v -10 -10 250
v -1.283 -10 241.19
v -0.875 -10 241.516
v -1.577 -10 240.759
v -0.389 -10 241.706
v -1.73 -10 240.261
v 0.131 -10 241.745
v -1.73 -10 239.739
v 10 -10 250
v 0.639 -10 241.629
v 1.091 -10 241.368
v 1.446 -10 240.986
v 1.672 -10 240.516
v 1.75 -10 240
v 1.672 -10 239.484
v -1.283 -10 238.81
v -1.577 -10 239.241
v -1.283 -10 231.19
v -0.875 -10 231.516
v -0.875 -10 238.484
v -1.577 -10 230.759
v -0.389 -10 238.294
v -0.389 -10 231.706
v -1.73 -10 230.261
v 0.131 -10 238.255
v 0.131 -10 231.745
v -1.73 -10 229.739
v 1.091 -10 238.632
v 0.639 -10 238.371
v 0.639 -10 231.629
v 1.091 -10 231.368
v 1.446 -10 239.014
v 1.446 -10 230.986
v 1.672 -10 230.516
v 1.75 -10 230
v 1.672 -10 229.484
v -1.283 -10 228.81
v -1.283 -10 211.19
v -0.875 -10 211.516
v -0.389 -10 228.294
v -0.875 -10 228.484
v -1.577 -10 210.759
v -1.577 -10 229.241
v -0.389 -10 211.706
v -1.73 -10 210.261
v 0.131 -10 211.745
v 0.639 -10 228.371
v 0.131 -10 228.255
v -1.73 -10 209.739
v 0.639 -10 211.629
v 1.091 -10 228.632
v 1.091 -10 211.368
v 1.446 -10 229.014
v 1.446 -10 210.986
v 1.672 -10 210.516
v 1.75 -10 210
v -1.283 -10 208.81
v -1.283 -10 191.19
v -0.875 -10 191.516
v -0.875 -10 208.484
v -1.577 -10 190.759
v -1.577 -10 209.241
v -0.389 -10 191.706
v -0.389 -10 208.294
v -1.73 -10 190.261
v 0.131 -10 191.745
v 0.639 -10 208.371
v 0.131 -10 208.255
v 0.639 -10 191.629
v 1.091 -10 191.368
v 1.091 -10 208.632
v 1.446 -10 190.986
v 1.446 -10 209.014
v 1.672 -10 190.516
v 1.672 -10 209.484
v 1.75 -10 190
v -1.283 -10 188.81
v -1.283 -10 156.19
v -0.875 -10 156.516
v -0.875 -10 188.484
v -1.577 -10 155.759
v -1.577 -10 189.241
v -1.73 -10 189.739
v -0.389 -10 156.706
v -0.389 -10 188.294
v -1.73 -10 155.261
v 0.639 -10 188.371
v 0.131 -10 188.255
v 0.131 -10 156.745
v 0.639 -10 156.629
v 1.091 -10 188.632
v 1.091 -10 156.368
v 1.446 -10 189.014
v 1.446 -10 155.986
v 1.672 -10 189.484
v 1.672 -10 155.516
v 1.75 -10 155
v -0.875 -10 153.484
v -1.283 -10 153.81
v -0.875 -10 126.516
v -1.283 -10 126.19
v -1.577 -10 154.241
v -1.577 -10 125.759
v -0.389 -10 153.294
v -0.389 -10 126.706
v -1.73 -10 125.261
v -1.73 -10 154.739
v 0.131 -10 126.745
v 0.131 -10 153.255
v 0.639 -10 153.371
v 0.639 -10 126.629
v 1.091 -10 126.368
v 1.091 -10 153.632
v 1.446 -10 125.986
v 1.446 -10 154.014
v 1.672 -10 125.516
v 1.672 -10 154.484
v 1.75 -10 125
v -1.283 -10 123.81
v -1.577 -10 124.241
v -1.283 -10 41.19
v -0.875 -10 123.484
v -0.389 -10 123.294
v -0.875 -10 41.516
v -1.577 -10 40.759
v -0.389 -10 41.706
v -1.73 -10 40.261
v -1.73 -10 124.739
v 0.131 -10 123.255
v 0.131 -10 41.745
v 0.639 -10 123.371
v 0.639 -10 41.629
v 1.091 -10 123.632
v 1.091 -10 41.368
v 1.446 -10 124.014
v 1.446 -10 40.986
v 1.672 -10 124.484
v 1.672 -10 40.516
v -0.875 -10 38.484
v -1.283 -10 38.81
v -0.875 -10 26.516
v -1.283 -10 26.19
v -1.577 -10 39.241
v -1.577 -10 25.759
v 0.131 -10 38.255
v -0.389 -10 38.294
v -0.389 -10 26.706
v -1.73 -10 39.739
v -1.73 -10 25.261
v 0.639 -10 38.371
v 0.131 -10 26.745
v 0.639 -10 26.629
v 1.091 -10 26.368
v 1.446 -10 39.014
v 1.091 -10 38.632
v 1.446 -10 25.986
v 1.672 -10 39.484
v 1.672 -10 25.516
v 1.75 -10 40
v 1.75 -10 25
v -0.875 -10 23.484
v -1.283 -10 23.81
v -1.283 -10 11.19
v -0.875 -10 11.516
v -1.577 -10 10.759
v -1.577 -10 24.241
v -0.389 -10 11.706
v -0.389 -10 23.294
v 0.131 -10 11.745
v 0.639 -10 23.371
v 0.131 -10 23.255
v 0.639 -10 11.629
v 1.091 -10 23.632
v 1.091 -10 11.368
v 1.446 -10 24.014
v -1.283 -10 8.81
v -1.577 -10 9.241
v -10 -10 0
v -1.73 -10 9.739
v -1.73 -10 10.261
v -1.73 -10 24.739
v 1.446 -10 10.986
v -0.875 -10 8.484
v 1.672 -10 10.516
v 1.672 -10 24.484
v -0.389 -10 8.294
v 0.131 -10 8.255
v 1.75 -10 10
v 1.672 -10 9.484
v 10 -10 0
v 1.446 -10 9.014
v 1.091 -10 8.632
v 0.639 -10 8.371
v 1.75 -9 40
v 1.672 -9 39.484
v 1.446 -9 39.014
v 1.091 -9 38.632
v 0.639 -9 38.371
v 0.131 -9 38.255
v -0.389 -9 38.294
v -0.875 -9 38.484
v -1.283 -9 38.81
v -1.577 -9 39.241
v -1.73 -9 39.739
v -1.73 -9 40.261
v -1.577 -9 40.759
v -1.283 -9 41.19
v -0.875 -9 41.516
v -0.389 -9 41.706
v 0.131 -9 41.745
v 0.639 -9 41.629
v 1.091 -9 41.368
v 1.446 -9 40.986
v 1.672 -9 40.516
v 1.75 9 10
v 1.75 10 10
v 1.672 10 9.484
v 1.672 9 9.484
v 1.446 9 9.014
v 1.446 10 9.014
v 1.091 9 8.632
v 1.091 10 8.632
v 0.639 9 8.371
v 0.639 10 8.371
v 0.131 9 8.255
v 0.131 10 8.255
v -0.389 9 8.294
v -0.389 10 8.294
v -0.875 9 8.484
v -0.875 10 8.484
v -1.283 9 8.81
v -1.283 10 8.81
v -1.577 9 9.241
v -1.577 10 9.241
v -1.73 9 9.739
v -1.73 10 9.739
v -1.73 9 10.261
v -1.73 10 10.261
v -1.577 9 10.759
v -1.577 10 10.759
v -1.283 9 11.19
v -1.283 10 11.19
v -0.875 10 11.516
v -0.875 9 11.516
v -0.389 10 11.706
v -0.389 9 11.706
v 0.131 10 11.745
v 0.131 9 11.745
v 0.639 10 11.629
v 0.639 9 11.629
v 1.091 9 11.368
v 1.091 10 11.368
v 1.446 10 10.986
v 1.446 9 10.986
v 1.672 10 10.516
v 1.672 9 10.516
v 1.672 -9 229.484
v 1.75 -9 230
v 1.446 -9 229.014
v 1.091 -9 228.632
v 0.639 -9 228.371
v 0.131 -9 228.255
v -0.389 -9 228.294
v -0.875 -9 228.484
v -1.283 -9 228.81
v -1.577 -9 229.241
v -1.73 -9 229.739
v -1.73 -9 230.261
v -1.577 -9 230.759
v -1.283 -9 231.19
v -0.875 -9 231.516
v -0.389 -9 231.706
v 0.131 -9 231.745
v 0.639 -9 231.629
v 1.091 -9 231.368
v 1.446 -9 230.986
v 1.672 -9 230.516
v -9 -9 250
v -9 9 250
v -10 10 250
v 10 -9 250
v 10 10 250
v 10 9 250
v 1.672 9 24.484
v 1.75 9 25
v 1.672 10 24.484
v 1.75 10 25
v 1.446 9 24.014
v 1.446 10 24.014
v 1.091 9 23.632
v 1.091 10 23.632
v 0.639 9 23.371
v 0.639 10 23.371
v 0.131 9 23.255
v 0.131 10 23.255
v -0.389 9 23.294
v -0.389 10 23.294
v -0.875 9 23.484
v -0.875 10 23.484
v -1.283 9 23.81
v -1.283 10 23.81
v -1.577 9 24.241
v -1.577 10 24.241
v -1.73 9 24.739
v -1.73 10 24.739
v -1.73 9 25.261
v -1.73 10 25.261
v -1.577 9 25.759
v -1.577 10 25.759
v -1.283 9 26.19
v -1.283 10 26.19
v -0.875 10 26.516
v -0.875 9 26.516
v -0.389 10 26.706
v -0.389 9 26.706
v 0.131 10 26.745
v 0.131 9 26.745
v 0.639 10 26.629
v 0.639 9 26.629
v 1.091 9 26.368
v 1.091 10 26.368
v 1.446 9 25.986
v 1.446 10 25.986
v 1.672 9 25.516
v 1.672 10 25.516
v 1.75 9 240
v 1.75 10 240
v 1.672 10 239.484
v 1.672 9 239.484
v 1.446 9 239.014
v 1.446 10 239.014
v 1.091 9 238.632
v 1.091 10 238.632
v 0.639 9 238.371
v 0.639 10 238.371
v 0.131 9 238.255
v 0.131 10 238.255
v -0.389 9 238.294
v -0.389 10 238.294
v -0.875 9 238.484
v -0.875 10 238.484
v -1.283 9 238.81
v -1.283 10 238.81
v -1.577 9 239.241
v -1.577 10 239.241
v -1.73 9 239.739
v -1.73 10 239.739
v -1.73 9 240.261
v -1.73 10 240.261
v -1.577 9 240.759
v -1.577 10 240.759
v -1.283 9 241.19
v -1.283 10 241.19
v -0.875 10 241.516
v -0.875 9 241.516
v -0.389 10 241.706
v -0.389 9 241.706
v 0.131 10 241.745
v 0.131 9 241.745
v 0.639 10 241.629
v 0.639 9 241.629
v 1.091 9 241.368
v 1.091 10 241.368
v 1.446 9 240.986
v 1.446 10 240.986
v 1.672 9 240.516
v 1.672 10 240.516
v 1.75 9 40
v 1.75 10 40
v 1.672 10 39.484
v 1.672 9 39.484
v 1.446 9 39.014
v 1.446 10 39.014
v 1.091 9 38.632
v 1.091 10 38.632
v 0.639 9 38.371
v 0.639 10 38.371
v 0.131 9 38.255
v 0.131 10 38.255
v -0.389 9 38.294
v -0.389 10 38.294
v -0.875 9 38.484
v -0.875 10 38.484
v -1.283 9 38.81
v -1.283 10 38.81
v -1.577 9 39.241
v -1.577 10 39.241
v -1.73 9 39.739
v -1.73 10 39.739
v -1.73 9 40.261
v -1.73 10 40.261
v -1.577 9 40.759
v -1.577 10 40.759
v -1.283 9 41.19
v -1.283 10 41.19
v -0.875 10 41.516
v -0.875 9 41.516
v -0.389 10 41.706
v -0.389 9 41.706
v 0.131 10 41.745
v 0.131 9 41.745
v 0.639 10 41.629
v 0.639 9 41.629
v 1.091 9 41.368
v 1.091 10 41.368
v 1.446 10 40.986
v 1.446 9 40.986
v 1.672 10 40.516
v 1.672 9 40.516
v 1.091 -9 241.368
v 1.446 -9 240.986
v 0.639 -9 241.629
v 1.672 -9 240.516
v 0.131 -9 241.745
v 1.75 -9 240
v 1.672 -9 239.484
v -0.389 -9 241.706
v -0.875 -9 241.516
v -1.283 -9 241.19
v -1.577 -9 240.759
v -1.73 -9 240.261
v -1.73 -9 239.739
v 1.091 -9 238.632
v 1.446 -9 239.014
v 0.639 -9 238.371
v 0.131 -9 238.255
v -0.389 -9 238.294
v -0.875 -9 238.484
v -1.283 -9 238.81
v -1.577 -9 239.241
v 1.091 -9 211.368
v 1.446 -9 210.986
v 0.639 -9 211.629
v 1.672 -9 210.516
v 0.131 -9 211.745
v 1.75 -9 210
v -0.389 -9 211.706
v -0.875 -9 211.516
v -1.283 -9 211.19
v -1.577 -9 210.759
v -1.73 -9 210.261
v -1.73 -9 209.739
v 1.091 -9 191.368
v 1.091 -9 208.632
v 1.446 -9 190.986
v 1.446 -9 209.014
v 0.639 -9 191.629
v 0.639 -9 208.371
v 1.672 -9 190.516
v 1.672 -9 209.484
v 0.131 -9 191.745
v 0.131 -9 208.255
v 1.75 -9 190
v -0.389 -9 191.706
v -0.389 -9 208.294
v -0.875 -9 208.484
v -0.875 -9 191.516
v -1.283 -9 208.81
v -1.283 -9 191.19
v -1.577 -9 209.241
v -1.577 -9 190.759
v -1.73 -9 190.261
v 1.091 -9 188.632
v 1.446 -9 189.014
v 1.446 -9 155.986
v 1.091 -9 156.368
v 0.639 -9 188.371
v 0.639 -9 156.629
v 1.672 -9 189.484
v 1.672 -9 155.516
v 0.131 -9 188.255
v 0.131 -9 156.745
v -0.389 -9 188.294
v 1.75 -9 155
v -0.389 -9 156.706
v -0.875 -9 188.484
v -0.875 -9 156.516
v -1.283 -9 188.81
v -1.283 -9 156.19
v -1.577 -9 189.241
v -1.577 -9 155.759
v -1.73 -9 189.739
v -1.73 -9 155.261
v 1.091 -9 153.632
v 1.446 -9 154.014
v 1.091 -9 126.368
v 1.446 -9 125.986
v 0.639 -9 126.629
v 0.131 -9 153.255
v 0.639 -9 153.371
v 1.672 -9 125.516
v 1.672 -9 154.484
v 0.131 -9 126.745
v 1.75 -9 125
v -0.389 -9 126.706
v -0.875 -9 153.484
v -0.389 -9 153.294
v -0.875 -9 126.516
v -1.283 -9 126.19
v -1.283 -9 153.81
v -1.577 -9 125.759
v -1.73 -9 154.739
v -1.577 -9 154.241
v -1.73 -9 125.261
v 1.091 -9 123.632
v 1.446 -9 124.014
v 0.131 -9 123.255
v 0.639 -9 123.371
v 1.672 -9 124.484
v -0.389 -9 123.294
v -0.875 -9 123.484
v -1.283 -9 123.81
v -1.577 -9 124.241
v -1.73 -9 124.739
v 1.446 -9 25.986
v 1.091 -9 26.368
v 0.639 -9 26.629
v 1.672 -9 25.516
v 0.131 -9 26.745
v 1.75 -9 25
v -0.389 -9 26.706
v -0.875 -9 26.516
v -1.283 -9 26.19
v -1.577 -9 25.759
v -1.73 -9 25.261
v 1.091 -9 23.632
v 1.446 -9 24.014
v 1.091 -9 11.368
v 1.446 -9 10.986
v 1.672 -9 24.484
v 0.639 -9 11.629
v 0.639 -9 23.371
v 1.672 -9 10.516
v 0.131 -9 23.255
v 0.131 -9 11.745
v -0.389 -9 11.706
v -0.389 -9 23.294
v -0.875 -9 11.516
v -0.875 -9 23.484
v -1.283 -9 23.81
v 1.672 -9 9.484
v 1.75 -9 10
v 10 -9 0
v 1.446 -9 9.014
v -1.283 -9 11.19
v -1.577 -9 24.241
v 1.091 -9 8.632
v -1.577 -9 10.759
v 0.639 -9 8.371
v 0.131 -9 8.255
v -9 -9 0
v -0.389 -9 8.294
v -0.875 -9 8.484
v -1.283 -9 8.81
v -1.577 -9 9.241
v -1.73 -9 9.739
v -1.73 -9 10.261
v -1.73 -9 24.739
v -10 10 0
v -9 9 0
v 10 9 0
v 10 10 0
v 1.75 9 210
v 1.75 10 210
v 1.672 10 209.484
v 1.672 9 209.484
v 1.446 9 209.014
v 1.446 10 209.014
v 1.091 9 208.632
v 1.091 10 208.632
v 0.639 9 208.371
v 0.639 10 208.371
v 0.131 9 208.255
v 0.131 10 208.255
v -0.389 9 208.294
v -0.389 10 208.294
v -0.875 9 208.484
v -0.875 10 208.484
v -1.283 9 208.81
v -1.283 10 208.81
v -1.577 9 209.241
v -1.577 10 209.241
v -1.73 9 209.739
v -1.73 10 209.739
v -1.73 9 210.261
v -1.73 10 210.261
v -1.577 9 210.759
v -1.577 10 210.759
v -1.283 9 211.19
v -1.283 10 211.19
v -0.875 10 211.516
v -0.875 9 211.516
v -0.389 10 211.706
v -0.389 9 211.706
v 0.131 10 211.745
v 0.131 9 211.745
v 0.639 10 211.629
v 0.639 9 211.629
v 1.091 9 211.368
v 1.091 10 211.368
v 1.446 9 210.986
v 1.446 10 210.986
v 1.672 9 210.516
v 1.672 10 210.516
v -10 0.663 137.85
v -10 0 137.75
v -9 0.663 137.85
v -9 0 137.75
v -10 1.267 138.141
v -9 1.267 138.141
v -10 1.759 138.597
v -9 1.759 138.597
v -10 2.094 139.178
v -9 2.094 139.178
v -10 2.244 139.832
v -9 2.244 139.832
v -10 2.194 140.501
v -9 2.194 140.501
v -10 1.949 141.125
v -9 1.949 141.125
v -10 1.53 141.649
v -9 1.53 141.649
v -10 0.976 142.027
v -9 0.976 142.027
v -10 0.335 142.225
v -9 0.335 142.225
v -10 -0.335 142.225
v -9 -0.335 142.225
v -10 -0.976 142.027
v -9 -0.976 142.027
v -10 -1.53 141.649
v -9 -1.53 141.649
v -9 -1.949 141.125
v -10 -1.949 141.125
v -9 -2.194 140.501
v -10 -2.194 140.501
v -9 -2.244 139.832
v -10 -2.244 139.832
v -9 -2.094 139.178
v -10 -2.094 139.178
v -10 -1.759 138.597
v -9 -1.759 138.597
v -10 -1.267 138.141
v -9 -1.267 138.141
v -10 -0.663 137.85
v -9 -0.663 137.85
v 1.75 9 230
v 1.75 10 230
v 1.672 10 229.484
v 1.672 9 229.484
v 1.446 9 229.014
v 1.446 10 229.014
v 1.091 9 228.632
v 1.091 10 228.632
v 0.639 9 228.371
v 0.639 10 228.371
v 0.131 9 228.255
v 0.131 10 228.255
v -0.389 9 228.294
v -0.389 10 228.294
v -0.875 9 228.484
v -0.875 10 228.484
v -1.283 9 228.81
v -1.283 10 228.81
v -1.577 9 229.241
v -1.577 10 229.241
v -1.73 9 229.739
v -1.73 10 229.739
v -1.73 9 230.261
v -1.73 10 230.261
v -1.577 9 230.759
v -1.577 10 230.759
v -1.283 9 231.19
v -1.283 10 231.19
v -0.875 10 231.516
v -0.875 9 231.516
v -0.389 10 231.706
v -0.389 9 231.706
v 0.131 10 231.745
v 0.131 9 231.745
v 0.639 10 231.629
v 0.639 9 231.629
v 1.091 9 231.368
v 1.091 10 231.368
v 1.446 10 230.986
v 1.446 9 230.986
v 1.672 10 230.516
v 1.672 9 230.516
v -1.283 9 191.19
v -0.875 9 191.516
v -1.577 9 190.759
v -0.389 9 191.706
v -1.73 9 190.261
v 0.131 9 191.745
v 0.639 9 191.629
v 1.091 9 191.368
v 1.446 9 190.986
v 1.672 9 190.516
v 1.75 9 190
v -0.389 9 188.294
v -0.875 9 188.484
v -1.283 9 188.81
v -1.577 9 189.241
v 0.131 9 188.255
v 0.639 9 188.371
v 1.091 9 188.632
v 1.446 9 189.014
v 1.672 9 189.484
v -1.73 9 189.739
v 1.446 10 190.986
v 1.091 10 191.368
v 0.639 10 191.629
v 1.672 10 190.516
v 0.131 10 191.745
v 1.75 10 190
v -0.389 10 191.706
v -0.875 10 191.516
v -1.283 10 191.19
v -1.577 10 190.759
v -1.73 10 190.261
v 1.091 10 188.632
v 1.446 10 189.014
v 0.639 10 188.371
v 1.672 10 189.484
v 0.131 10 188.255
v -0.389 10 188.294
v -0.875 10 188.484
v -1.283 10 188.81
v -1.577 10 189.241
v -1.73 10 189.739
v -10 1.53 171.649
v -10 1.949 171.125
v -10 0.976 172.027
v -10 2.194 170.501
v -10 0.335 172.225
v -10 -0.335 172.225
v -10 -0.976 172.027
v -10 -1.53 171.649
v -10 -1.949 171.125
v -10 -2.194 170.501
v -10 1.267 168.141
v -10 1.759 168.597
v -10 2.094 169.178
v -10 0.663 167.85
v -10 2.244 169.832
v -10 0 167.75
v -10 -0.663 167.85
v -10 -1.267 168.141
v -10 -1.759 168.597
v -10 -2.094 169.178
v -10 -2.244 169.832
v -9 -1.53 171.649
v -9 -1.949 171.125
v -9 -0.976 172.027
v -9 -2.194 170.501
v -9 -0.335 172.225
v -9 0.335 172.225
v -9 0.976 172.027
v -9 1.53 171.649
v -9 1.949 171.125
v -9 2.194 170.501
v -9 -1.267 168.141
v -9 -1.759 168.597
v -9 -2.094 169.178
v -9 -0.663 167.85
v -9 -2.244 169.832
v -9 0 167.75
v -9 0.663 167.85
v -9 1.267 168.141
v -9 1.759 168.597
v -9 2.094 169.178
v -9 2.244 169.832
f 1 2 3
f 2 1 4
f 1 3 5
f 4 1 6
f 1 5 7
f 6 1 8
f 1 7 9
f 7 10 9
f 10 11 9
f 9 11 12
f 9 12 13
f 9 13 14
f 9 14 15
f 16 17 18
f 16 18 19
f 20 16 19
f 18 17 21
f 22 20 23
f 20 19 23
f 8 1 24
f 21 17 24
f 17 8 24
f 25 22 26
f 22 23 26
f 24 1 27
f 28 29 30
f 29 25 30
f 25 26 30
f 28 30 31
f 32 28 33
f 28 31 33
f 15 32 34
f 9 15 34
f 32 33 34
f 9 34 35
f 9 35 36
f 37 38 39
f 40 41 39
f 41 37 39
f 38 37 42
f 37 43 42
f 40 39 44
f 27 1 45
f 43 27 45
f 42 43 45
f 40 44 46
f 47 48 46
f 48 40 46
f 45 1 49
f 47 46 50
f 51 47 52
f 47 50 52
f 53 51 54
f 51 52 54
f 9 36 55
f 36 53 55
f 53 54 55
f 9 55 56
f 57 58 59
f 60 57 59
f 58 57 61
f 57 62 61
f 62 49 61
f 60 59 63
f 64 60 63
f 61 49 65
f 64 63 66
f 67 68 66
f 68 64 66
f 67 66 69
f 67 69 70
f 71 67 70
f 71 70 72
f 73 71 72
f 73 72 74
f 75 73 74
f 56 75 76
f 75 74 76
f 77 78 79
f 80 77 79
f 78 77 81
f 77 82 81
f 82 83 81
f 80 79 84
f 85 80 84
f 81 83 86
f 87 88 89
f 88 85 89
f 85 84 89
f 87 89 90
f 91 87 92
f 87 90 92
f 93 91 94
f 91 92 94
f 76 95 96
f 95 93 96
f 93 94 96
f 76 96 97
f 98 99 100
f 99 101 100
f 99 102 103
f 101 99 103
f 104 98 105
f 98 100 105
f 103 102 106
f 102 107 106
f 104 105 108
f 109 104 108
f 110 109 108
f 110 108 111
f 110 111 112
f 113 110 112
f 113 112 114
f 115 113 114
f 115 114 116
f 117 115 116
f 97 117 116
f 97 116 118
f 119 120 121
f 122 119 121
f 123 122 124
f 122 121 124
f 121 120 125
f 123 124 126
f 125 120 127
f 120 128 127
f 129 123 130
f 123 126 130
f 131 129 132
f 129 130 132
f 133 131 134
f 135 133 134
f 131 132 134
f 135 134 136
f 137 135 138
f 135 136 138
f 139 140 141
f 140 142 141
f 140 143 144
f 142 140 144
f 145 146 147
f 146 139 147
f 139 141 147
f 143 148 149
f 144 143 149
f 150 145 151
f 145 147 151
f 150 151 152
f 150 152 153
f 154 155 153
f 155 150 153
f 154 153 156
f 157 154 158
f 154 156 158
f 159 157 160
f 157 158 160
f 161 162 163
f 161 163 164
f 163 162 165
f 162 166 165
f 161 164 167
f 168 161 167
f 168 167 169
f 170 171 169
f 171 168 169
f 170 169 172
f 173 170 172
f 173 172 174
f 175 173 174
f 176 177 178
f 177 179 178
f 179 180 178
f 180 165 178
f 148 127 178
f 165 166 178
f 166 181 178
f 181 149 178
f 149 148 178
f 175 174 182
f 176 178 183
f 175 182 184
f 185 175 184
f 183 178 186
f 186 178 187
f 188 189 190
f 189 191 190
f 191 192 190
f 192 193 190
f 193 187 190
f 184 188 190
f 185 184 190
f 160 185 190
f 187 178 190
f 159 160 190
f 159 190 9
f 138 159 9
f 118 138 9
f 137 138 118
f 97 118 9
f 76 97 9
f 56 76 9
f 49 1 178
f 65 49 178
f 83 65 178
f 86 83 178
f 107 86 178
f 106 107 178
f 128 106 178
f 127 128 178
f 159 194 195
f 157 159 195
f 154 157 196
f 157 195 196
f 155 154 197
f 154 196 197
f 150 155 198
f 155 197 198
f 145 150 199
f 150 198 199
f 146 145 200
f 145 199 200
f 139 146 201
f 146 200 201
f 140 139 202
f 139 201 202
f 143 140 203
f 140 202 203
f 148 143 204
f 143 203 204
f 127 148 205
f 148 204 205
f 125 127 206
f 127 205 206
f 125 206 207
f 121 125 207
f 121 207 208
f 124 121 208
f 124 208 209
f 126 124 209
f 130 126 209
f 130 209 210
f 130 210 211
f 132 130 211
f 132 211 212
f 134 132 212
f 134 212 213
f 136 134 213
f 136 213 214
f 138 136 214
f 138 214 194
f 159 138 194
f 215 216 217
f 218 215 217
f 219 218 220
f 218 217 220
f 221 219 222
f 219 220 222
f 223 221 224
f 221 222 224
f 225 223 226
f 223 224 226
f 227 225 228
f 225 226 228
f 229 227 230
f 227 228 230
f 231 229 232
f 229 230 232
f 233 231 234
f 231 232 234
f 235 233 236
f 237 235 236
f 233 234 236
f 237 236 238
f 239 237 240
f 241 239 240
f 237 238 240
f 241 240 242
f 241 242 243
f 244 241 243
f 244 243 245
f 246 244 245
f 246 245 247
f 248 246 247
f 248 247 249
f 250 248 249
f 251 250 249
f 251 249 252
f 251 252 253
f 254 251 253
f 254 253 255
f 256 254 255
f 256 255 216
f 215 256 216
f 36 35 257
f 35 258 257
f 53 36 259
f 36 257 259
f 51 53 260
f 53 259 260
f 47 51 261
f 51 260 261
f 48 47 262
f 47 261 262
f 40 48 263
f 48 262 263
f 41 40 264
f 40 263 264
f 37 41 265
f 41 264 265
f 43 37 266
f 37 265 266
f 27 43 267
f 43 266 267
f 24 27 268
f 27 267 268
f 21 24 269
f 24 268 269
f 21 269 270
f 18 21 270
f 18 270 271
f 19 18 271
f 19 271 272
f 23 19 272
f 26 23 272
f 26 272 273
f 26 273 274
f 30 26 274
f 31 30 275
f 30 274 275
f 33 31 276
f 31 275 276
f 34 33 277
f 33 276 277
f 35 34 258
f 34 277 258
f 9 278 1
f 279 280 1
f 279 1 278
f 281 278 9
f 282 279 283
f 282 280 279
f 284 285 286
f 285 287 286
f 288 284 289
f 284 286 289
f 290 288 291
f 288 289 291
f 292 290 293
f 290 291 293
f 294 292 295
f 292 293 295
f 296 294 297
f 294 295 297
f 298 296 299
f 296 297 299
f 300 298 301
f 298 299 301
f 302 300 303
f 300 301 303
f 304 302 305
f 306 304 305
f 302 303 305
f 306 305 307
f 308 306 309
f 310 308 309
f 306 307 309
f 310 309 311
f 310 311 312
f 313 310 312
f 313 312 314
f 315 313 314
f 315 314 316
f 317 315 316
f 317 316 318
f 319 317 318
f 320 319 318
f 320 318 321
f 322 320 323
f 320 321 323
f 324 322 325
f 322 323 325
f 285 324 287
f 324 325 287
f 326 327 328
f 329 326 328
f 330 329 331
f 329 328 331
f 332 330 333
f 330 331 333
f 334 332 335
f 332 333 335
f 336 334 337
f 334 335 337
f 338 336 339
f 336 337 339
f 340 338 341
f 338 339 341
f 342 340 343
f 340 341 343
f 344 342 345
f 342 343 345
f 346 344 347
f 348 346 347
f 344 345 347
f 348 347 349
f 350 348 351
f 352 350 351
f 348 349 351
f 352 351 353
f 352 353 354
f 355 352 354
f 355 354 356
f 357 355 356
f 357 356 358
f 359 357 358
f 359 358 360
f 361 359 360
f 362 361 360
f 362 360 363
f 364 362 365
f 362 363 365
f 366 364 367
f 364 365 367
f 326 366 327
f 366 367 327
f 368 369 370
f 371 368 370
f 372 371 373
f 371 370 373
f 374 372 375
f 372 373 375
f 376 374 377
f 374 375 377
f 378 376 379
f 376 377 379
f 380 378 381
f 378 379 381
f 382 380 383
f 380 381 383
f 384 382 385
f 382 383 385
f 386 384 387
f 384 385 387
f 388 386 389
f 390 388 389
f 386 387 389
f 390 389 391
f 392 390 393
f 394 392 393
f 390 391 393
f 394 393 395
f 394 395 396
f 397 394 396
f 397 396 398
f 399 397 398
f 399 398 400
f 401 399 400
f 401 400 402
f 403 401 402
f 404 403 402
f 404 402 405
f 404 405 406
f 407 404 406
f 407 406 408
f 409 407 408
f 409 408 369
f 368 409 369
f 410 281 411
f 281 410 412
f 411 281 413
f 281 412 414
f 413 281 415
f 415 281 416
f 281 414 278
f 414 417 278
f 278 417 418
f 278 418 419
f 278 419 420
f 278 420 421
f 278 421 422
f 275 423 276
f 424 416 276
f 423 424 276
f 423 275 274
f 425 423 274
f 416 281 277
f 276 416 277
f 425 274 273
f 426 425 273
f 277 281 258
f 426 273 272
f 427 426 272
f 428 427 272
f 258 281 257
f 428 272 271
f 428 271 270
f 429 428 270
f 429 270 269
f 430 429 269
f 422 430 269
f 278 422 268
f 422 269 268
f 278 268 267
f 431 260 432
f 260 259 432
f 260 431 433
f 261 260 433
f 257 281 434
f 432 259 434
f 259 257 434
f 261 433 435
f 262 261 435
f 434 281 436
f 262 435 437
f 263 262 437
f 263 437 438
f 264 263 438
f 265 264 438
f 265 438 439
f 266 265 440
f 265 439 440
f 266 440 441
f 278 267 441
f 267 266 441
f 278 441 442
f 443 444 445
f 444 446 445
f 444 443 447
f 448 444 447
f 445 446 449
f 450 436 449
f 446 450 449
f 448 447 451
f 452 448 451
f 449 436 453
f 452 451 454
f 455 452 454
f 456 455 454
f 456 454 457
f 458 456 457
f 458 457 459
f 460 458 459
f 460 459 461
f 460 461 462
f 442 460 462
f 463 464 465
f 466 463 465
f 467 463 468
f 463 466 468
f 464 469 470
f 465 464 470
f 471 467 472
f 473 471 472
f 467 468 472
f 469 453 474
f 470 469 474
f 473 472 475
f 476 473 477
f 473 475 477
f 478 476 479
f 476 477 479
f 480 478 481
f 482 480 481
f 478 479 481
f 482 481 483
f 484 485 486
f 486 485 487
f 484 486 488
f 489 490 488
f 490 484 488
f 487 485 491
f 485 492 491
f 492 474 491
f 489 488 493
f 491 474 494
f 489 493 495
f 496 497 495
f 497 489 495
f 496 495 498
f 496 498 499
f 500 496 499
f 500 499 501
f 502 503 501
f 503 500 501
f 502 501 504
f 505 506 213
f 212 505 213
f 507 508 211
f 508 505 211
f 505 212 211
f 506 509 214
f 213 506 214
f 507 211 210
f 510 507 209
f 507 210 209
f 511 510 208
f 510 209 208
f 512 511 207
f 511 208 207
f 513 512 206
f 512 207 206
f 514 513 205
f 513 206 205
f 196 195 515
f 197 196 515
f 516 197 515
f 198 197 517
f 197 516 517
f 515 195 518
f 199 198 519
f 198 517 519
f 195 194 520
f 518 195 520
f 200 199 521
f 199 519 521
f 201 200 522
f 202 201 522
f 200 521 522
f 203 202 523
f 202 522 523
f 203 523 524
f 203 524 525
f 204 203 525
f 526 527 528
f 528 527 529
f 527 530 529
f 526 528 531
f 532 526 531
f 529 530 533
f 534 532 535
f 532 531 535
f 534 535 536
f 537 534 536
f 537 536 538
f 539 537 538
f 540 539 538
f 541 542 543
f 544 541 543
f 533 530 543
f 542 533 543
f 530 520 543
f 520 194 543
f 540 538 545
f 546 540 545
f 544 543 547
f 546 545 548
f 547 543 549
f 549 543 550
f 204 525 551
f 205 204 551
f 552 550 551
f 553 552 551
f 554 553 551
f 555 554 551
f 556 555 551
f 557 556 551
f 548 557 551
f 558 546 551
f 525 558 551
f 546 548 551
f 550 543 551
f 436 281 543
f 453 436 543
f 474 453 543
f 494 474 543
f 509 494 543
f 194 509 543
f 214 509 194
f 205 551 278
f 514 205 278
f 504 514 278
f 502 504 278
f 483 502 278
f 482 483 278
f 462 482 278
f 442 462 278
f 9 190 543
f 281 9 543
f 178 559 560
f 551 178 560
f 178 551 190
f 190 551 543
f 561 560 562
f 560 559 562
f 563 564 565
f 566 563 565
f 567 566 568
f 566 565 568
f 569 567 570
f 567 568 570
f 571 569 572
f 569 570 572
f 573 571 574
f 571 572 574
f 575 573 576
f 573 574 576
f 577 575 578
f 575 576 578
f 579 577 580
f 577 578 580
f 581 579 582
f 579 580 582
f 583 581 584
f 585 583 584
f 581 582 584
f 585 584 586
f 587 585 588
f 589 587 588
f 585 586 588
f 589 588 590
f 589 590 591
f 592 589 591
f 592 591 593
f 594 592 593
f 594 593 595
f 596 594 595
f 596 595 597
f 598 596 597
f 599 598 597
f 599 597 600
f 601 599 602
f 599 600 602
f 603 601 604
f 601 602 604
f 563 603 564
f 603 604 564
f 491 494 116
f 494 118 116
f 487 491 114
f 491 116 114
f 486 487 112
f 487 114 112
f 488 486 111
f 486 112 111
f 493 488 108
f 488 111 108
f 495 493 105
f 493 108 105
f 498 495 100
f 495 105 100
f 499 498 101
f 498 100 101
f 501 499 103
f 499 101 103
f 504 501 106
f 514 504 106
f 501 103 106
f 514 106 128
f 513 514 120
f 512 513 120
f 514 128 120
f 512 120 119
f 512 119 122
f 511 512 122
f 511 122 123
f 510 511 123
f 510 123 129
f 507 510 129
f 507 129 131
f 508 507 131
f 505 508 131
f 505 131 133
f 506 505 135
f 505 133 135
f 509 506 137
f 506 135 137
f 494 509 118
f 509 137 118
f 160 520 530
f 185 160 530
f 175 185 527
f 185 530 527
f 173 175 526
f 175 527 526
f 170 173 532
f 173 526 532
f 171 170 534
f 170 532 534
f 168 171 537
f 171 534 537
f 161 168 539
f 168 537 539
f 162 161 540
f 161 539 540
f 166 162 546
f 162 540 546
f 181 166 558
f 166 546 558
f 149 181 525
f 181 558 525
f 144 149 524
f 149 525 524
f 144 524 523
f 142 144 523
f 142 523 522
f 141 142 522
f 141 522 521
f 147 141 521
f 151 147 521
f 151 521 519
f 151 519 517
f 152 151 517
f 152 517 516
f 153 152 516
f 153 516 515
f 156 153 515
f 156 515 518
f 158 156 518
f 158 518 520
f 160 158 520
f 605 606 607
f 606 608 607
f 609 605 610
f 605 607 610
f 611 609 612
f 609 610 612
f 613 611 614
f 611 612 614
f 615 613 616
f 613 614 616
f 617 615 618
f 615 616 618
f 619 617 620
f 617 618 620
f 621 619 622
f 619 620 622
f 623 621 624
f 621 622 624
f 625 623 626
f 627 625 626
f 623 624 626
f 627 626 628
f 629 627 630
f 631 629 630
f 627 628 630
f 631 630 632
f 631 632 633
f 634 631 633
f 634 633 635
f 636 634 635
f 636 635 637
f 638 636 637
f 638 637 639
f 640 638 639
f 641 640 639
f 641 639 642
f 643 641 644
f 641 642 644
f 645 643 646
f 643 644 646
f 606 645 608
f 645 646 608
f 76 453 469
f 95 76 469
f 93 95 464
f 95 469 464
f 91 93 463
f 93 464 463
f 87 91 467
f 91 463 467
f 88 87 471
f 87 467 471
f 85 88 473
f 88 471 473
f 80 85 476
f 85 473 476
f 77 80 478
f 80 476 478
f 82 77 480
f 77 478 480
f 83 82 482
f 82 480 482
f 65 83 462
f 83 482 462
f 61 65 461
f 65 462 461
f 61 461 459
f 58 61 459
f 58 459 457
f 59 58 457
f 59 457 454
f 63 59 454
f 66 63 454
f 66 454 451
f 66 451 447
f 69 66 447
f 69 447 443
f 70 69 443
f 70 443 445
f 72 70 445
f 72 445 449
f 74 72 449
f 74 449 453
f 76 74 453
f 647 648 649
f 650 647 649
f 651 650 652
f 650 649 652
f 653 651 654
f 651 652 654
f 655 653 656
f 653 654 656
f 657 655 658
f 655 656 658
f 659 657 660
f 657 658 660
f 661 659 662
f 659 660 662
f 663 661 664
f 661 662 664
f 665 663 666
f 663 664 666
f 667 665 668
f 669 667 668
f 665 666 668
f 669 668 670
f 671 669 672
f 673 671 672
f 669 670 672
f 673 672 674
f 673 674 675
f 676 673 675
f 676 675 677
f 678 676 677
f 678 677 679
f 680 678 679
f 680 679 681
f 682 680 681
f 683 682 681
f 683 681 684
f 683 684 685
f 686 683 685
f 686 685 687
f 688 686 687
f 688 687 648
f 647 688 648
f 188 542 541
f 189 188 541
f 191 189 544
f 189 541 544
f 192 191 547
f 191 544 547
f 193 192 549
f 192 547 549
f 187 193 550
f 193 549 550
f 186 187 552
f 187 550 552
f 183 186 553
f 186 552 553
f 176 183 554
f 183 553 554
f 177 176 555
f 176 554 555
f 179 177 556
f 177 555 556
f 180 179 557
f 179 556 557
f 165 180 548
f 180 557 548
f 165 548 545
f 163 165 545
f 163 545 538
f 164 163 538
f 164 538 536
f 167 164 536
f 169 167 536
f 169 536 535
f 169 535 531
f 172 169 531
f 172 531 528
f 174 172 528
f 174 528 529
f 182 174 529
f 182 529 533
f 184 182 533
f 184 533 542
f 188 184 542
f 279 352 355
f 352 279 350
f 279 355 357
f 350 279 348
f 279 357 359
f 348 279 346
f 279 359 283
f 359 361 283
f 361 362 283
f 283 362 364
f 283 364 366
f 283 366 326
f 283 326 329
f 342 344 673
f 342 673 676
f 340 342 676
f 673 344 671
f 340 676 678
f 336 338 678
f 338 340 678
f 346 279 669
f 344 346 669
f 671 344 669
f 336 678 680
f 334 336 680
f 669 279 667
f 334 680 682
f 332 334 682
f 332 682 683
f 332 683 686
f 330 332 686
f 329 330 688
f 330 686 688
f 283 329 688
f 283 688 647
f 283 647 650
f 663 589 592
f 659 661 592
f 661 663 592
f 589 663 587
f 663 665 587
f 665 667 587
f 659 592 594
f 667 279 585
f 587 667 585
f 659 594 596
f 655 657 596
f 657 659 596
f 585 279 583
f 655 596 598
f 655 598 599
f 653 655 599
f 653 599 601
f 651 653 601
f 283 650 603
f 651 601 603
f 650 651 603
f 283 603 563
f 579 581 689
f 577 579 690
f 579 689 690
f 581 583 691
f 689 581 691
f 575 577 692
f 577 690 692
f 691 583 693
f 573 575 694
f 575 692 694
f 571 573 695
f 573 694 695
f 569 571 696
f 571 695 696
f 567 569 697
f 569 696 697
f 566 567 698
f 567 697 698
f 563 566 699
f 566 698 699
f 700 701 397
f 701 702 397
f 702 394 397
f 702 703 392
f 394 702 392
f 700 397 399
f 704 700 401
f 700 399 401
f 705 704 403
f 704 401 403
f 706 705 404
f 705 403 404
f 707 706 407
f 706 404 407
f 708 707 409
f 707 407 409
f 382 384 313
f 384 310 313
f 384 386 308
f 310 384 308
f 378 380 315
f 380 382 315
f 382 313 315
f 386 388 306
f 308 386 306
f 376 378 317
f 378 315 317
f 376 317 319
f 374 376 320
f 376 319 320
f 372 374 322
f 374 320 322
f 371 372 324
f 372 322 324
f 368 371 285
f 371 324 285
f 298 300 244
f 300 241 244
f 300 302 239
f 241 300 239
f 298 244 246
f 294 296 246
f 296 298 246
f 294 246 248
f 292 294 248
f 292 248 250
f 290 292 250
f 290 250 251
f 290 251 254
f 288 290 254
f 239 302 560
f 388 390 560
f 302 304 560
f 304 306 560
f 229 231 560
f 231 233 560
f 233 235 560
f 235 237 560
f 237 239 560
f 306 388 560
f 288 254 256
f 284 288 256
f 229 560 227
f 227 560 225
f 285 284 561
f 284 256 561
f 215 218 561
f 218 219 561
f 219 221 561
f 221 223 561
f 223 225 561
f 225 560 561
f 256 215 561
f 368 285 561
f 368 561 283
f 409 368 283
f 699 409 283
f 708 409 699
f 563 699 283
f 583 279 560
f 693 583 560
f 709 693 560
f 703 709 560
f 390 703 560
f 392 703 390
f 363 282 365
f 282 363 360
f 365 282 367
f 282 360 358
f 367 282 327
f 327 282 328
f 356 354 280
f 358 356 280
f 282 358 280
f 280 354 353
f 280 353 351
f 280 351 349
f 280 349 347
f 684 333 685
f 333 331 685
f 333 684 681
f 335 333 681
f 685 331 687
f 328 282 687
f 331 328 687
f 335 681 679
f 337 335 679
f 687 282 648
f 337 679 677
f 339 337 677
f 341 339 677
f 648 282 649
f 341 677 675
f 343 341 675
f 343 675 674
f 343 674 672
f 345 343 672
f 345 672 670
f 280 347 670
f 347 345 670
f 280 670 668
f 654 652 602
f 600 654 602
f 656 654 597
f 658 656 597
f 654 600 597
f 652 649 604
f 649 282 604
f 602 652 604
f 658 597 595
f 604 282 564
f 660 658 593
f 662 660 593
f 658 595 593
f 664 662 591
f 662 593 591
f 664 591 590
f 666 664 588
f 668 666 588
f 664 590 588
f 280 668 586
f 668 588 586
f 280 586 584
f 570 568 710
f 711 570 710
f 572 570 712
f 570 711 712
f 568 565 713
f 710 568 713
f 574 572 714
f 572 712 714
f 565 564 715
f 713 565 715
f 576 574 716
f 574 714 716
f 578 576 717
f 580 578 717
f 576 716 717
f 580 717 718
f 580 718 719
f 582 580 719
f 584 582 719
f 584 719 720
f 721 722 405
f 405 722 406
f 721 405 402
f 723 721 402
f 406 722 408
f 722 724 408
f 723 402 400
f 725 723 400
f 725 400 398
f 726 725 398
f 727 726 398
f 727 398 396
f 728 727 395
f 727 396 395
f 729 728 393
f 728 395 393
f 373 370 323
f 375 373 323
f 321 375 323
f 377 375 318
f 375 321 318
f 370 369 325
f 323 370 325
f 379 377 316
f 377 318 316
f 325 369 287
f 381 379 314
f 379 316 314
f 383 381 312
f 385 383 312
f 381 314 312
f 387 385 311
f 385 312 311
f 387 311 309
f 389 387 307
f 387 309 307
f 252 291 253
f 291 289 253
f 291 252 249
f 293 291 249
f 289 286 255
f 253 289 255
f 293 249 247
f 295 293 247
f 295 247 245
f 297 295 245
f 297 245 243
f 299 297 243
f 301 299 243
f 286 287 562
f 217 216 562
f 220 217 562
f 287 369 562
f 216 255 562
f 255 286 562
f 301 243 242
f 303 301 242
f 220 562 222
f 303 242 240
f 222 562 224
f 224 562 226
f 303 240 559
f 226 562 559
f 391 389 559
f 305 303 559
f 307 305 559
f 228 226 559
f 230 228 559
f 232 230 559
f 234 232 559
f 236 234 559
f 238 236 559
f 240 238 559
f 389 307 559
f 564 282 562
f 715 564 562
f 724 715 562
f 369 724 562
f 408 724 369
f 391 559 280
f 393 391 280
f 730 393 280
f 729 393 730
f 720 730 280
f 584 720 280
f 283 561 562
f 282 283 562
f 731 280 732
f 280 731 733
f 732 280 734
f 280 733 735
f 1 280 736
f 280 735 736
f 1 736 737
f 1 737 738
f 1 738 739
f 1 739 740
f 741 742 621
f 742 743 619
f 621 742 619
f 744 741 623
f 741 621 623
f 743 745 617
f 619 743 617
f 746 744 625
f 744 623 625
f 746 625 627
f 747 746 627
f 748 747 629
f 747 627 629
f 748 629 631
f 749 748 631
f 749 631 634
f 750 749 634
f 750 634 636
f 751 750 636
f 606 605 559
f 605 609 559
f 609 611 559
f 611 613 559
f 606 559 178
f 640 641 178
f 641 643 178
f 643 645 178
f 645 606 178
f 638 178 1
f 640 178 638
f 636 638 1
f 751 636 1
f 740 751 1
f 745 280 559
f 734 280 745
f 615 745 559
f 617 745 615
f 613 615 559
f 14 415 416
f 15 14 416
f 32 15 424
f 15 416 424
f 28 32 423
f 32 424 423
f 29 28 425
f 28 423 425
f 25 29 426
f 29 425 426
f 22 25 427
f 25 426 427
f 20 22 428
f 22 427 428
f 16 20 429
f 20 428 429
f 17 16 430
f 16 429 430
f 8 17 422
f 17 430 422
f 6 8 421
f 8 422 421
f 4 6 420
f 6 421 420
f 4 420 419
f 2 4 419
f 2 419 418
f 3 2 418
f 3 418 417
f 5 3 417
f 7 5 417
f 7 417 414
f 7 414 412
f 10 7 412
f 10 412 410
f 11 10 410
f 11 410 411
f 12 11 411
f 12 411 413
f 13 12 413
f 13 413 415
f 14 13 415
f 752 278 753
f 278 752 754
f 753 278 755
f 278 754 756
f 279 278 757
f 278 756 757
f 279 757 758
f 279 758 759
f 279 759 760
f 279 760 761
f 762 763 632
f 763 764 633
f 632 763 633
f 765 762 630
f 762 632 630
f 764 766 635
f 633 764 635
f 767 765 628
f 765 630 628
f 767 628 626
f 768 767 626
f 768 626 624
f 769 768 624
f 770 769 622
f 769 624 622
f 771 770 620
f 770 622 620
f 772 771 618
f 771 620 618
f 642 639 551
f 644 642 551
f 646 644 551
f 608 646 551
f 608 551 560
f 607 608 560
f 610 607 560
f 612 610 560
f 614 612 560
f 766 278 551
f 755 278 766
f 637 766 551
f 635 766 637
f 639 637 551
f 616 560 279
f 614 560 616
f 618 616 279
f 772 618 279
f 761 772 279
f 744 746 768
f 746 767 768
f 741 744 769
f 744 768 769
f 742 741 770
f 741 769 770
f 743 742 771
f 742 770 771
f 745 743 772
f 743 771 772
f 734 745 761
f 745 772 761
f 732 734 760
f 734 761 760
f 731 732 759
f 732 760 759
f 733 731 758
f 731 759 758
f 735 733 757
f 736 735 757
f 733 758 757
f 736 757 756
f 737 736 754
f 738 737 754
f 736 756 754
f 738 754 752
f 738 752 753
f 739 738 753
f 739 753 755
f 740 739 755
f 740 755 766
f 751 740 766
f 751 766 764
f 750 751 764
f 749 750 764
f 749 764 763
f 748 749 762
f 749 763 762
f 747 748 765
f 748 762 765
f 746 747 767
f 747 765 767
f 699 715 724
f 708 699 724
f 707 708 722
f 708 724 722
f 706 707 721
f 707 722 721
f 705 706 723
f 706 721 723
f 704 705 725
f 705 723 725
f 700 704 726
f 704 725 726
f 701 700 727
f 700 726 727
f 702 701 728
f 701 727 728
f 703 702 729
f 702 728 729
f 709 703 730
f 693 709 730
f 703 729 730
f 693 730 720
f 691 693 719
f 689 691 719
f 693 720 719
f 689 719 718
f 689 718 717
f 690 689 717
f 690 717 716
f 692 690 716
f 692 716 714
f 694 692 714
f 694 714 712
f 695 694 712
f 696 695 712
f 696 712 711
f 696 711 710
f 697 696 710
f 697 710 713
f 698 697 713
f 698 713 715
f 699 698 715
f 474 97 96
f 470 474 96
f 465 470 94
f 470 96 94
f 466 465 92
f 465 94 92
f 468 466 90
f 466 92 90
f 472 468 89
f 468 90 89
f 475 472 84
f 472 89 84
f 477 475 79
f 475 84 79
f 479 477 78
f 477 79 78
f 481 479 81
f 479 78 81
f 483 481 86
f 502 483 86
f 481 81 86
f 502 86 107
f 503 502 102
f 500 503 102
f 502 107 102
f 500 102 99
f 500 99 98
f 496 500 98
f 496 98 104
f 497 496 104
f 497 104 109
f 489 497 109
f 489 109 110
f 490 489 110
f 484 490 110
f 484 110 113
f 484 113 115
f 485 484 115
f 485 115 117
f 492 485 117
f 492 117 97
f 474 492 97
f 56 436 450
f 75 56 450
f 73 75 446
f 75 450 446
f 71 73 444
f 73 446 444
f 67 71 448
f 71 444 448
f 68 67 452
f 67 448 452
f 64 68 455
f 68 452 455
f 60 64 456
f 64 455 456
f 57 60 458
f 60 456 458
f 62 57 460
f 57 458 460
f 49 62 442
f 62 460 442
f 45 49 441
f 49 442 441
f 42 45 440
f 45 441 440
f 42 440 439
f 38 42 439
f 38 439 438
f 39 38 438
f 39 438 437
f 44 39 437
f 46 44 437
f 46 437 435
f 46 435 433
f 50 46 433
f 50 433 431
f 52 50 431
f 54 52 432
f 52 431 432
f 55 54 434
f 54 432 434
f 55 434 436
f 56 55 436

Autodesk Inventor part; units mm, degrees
ref_plane "YZ Plane" through (0, 0, 0) normal (1, 0, 0) x (0, 1, 0)
ref_plane "XZ Plane" through (0, 0, 0) normal (0, 1, 0) x (-1, 0, 0)
ref_plane "XY Plane" through (0, 0, 0) normal (0, 0, 1) x (1, 0, 0)
sketch "スケッチ1" plane through (0, 0, 0) normal (0, 0, 1) x (1, 0, 0)
  line L0 (-10, -10) -> (10, -10)
  line L1 (10, -10) -> (10, 10)
  line L2 (10, 10) -> (-10, 10)
  line L3 (-10, 10) -> (-10, -10)
  line L4 (-10, -10) -> (10, 10) construction
  line L5 (10, -10) -> (-10, 10) construction
  line L6 (9, -9) -> (-9, -9)
  line L7 (-9, -9) -> (-9, 9)
  line L8 (-9, 9) -> (9, 9)
  line L9 (9, 9) -> (9, -9)
  line L10 (9, -9) -> (-9, 9) construction
  line L11 (-9, -9) -> (9, 9) construction
  line L12 (9, 9) -> (10, 9)
  line L13 (9, -9) -> (10, -9)
  point P0 (0, 0)
  dimension "d0" = 20
  dimension "d1" = 20
  dimension "d2" = 1
extrude "押し出し1" add sketch "スケッチ1" along normal blind 250 contours L3 L2 L1 L12 L8 L7 L6 L13 L0
sketch "スケッチ2" plane through (-10, -10, 0) normal (0, -1, 0) x (1, 0, 0)
  circle A0 centre (10, 155) radius 1.75
  circle A1 centre (10, 125) radius 1.75
  line L0 (0, 0) -> (0, 250) projected
  line L1 (0, 250) -> (20, 250) projected
  point P0 (10, 0)
  dimension "d5" = 3.5
  dimension "d7" = 10
  dimension "d8" = 95
  dimension "d9" = 30
extrude "押し出し2" cut sketch "スケッチ2" against normal up to surface (1 mm away)
sketch "スケッチ3" plane through (-9, -9, 0) normal (1, 0, 0) x (0, 0, -1)
  line L0 (-156.75, 0) -> (-153.25, 0) projected
  circle A0 centre (-170, 9) radius 2.25
  circle A1 centre (-140, 9) radius 2.25
  line L1 (0, -1) -> (-250, -1) projected
  point P0 (0, 9)
  point P1 (-155, 0)
  dimension "d12" = 4.5
  dimension "d13" = 4.5
  dimension "d14" = 15
  dimension "d15" = 10
  dimension "d16" = 30
extrude "押し出し3" cut sketch "スケッチ3" against normal through all
sketch "スケッチ5" plane through (-10, 10, 0) normal (0, 1, 0) x (1, 0, 0)
  circle A0 centre (10, -240) radius 1.75
  circle A1 centre (10, -10) radius 1.75
  circle A2 centre (10, -25) radius 1.75
  circle A3 centre (10, -230) radius 1.75
  circle A4 centre (10, -40) radius 1.75
  line L0 (20, 0) -> (0, 0) projected
  line L1 (20, -250) -> (0, -250) projected
  point P0 (10, 0)
  point P1 (10, 0)
  dimension "d19" = 3.5
  dimension "d20" = 10
  dimension "d21" = 10
  dimension "d22" = 10
  dimension "d23" = 15
  dimension "d24" = 15
extrude "押し出し4" cut sketch "スケッチ5" against normal through all
sketch "スケッチ6" plane through (-10, 10, 0) normal (0, 1, 0) x (1, 0, 0)
  circle A0 centre (10, -210) radius 1.75
  circle A1 centre (10, -190) radius 1.75
  circle A2 centre (10, -240) radius 1.75 projected
  line L0 (20, -250) -> (0, -250) projected
  point P0 (10, 0)
  dimension "d27" = 40
  dimension "d28" = 20
extrude "押し出し5" cut sketch "スケッチ6" against normal through all contours A0 | A1
equation "\"d24\" = d23"
properties part number "gear_plate_pole" material "アルミニウム 6061"
